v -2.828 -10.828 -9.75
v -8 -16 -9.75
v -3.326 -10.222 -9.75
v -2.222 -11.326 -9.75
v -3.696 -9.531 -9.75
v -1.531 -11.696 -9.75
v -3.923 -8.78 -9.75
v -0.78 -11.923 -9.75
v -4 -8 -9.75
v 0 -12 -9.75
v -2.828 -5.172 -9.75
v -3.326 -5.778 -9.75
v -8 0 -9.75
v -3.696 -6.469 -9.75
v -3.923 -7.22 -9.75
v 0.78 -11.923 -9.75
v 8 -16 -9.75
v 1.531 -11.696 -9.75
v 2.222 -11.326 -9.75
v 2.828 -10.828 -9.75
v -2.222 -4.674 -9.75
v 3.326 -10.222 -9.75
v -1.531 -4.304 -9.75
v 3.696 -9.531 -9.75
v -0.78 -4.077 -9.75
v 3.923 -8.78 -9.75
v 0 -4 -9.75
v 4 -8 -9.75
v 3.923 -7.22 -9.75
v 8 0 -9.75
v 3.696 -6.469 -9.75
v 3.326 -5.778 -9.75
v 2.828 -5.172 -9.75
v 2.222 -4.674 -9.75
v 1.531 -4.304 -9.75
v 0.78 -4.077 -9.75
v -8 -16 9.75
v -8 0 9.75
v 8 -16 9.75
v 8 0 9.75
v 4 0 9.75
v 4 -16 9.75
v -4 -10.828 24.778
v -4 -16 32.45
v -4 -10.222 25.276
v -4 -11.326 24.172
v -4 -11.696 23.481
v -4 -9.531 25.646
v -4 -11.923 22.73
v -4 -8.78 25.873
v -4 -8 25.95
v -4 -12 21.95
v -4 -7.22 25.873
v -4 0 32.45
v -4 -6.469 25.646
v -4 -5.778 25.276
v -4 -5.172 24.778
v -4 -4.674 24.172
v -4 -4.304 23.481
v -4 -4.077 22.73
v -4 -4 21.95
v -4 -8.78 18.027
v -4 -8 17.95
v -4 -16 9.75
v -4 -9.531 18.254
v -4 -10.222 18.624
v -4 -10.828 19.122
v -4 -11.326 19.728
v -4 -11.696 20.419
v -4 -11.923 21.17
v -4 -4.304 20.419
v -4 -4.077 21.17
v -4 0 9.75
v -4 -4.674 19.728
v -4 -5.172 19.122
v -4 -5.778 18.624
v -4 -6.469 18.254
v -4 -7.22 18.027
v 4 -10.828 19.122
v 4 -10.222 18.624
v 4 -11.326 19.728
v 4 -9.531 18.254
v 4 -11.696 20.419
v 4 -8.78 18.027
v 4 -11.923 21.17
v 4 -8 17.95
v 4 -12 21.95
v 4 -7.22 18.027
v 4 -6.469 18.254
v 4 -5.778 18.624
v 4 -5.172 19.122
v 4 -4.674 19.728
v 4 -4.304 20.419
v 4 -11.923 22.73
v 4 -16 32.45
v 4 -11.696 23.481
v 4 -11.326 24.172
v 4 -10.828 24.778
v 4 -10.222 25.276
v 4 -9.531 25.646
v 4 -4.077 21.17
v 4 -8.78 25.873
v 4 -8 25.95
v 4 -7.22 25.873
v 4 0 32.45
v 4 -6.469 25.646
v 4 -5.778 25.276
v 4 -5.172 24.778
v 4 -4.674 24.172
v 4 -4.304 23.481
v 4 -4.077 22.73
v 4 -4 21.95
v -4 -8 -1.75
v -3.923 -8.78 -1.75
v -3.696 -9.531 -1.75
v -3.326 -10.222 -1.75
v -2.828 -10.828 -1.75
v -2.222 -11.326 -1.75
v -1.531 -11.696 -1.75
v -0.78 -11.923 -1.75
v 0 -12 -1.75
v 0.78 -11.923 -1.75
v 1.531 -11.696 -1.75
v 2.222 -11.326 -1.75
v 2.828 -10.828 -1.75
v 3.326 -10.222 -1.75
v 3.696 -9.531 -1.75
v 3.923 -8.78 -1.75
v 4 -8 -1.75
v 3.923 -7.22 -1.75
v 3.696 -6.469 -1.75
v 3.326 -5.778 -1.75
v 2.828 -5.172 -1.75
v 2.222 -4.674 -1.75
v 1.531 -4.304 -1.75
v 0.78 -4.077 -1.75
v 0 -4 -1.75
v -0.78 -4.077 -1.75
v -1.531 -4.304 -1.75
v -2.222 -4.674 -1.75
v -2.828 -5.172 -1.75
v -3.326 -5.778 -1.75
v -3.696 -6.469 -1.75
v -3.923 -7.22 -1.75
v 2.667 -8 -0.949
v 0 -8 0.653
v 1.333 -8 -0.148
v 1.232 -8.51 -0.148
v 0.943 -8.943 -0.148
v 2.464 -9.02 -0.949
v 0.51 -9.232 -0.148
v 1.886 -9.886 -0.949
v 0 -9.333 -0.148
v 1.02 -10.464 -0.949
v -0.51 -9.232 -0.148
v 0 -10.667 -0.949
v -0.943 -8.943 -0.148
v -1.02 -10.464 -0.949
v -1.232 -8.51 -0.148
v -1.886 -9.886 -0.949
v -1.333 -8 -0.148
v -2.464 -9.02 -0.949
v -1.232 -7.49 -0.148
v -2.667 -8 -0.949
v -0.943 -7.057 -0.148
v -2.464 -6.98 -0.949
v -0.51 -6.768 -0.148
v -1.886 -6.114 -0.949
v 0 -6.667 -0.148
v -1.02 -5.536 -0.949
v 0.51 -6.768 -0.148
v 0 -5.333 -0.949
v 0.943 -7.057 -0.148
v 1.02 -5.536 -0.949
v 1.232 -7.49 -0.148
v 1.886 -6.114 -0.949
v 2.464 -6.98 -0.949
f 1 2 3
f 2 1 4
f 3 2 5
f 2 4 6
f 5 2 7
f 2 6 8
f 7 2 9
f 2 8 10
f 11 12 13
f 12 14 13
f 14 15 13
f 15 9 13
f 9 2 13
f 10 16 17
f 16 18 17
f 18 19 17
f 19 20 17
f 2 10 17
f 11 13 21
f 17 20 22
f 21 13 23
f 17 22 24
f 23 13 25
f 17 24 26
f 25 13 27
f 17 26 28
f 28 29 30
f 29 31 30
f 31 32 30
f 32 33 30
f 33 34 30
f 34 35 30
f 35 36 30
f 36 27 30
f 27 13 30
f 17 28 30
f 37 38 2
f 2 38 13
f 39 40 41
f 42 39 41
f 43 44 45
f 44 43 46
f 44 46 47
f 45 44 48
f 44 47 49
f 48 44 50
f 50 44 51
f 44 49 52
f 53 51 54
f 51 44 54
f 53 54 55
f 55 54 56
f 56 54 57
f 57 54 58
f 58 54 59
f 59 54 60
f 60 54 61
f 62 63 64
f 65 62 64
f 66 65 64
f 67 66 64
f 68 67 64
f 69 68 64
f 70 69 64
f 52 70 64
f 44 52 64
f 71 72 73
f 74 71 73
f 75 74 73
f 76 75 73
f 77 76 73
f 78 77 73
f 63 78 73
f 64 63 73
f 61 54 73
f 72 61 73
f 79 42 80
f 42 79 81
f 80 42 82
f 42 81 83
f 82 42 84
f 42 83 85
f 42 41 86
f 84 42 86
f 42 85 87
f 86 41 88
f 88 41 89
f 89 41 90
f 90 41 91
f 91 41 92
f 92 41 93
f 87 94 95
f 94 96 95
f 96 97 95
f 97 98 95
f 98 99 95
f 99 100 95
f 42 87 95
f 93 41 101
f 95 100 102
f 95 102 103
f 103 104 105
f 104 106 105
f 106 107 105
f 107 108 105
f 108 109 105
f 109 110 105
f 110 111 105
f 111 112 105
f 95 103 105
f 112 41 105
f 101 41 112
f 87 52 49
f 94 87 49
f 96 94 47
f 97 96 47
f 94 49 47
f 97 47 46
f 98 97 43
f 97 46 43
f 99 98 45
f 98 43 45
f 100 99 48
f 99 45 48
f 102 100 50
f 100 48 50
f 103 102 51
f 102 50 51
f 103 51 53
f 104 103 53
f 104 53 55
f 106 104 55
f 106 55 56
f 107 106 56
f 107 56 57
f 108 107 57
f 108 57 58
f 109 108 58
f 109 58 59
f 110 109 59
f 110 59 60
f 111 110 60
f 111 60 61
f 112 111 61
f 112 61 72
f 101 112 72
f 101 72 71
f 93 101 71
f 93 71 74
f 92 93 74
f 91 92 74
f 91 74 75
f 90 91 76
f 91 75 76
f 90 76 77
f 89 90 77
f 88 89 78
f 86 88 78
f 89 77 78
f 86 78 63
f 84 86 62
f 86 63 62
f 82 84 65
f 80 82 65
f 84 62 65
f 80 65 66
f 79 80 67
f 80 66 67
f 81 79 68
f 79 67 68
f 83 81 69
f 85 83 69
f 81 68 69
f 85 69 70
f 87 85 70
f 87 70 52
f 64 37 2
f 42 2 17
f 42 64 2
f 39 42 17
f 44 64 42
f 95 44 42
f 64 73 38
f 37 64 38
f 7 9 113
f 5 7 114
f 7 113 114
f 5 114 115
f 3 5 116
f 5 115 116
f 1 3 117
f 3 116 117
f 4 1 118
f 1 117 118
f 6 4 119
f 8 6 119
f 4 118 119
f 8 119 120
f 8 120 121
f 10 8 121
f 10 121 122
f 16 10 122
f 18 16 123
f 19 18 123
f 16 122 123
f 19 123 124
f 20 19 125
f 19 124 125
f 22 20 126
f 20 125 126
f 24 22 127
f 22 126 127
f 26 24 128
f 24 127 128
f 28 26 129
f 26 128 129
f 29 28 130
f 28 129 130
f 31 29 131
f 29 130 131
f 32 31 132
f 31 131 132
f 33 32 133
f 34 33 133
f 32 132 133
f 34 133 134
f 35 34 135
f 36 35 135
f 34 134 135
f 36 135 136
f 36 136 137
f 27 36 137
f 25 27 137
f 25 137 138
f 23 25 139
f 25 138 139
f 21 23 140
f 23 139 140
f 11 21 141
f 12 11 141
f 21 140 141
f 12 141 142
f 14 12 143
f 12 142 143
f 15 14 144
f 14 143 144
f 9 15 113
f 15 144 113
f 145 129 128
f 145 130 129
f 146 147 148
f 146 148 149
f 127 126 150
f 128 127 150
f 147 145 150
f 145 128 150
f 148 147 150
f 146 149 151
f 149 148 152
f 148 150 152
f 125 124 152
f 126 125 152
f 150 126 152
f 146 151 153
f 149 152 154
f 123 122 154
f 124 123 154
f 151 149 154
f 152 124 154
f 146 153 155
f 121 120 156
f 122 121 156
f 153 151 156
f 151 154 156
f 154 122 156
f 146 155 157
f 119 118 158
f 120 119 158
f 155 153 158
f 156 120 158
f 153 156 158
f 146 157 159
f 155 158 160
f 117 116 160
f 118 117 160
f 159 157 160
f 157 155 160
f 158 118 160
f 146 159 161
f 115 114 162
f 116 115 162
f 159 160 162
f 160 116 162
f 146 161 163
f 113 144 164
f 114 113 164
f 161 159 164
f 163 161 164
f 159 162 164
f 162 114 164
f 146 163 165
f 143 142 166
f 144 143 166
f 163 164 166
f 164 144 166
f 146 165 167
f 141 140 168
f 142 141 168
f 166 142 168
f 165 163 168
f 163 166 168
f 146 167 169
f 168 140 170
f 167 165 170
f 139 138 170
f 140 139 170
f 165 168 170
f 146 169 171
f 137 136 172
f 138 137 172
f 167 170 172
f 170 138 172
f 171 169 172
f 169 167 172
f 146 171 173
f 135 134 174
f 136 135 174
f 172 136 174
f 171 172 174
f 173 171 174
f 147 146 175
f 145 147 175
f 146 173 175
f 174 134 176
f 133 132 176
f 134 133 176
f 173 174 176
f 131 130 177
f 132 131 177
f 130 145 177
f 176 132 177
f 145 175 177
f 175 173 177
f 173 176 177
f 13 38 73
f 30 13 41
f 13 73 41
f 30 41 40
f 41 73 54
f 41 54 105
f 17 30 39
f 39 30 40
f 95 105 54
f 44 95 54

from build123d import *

# Parameters (mm, degrees)
F1_DEPTH = 16
F3_D     = 8
F5_D     = 8
F5_DEPTH = 8
F5_TIP   = 2.4034424761


with BuildPart() as f1:
    # F0 (on Front) → F1 (new body)
    with BuildSketch(Plane.XZ):
        Polygon((-8, -9.75), (8, -9.75), (8, 9.75), (4, 9.75), (4, 32.45), (0, 32.45), (-4, 32.45), (-4, 9.75), (-8, 9.75), align=None)
    extrude(amount=F1_DEPTH)

    # F3 (through all)
    with Locations(Plane.YZ.offset(4)):
        with Locations((-8, 21.95)):
            Hole(F3_D / 2)

    # F5
    with Locations(Plane(origin=(0, 0, -9.75), x_dir=(1, 0, 0), z_dir=(0, 0, -1))):
        with Locations((0, 8)):
            Hole(F5_D / 2, depth=F5_DEPTH)
            with Locations((0, 0, -(F5_DEPTH + F5_TIP / 2))):  # 118° drill point
                Cone(0, F5_D / 2, F5_TIP, mode=Mode.SUBTRACT)


solid = f1.part
